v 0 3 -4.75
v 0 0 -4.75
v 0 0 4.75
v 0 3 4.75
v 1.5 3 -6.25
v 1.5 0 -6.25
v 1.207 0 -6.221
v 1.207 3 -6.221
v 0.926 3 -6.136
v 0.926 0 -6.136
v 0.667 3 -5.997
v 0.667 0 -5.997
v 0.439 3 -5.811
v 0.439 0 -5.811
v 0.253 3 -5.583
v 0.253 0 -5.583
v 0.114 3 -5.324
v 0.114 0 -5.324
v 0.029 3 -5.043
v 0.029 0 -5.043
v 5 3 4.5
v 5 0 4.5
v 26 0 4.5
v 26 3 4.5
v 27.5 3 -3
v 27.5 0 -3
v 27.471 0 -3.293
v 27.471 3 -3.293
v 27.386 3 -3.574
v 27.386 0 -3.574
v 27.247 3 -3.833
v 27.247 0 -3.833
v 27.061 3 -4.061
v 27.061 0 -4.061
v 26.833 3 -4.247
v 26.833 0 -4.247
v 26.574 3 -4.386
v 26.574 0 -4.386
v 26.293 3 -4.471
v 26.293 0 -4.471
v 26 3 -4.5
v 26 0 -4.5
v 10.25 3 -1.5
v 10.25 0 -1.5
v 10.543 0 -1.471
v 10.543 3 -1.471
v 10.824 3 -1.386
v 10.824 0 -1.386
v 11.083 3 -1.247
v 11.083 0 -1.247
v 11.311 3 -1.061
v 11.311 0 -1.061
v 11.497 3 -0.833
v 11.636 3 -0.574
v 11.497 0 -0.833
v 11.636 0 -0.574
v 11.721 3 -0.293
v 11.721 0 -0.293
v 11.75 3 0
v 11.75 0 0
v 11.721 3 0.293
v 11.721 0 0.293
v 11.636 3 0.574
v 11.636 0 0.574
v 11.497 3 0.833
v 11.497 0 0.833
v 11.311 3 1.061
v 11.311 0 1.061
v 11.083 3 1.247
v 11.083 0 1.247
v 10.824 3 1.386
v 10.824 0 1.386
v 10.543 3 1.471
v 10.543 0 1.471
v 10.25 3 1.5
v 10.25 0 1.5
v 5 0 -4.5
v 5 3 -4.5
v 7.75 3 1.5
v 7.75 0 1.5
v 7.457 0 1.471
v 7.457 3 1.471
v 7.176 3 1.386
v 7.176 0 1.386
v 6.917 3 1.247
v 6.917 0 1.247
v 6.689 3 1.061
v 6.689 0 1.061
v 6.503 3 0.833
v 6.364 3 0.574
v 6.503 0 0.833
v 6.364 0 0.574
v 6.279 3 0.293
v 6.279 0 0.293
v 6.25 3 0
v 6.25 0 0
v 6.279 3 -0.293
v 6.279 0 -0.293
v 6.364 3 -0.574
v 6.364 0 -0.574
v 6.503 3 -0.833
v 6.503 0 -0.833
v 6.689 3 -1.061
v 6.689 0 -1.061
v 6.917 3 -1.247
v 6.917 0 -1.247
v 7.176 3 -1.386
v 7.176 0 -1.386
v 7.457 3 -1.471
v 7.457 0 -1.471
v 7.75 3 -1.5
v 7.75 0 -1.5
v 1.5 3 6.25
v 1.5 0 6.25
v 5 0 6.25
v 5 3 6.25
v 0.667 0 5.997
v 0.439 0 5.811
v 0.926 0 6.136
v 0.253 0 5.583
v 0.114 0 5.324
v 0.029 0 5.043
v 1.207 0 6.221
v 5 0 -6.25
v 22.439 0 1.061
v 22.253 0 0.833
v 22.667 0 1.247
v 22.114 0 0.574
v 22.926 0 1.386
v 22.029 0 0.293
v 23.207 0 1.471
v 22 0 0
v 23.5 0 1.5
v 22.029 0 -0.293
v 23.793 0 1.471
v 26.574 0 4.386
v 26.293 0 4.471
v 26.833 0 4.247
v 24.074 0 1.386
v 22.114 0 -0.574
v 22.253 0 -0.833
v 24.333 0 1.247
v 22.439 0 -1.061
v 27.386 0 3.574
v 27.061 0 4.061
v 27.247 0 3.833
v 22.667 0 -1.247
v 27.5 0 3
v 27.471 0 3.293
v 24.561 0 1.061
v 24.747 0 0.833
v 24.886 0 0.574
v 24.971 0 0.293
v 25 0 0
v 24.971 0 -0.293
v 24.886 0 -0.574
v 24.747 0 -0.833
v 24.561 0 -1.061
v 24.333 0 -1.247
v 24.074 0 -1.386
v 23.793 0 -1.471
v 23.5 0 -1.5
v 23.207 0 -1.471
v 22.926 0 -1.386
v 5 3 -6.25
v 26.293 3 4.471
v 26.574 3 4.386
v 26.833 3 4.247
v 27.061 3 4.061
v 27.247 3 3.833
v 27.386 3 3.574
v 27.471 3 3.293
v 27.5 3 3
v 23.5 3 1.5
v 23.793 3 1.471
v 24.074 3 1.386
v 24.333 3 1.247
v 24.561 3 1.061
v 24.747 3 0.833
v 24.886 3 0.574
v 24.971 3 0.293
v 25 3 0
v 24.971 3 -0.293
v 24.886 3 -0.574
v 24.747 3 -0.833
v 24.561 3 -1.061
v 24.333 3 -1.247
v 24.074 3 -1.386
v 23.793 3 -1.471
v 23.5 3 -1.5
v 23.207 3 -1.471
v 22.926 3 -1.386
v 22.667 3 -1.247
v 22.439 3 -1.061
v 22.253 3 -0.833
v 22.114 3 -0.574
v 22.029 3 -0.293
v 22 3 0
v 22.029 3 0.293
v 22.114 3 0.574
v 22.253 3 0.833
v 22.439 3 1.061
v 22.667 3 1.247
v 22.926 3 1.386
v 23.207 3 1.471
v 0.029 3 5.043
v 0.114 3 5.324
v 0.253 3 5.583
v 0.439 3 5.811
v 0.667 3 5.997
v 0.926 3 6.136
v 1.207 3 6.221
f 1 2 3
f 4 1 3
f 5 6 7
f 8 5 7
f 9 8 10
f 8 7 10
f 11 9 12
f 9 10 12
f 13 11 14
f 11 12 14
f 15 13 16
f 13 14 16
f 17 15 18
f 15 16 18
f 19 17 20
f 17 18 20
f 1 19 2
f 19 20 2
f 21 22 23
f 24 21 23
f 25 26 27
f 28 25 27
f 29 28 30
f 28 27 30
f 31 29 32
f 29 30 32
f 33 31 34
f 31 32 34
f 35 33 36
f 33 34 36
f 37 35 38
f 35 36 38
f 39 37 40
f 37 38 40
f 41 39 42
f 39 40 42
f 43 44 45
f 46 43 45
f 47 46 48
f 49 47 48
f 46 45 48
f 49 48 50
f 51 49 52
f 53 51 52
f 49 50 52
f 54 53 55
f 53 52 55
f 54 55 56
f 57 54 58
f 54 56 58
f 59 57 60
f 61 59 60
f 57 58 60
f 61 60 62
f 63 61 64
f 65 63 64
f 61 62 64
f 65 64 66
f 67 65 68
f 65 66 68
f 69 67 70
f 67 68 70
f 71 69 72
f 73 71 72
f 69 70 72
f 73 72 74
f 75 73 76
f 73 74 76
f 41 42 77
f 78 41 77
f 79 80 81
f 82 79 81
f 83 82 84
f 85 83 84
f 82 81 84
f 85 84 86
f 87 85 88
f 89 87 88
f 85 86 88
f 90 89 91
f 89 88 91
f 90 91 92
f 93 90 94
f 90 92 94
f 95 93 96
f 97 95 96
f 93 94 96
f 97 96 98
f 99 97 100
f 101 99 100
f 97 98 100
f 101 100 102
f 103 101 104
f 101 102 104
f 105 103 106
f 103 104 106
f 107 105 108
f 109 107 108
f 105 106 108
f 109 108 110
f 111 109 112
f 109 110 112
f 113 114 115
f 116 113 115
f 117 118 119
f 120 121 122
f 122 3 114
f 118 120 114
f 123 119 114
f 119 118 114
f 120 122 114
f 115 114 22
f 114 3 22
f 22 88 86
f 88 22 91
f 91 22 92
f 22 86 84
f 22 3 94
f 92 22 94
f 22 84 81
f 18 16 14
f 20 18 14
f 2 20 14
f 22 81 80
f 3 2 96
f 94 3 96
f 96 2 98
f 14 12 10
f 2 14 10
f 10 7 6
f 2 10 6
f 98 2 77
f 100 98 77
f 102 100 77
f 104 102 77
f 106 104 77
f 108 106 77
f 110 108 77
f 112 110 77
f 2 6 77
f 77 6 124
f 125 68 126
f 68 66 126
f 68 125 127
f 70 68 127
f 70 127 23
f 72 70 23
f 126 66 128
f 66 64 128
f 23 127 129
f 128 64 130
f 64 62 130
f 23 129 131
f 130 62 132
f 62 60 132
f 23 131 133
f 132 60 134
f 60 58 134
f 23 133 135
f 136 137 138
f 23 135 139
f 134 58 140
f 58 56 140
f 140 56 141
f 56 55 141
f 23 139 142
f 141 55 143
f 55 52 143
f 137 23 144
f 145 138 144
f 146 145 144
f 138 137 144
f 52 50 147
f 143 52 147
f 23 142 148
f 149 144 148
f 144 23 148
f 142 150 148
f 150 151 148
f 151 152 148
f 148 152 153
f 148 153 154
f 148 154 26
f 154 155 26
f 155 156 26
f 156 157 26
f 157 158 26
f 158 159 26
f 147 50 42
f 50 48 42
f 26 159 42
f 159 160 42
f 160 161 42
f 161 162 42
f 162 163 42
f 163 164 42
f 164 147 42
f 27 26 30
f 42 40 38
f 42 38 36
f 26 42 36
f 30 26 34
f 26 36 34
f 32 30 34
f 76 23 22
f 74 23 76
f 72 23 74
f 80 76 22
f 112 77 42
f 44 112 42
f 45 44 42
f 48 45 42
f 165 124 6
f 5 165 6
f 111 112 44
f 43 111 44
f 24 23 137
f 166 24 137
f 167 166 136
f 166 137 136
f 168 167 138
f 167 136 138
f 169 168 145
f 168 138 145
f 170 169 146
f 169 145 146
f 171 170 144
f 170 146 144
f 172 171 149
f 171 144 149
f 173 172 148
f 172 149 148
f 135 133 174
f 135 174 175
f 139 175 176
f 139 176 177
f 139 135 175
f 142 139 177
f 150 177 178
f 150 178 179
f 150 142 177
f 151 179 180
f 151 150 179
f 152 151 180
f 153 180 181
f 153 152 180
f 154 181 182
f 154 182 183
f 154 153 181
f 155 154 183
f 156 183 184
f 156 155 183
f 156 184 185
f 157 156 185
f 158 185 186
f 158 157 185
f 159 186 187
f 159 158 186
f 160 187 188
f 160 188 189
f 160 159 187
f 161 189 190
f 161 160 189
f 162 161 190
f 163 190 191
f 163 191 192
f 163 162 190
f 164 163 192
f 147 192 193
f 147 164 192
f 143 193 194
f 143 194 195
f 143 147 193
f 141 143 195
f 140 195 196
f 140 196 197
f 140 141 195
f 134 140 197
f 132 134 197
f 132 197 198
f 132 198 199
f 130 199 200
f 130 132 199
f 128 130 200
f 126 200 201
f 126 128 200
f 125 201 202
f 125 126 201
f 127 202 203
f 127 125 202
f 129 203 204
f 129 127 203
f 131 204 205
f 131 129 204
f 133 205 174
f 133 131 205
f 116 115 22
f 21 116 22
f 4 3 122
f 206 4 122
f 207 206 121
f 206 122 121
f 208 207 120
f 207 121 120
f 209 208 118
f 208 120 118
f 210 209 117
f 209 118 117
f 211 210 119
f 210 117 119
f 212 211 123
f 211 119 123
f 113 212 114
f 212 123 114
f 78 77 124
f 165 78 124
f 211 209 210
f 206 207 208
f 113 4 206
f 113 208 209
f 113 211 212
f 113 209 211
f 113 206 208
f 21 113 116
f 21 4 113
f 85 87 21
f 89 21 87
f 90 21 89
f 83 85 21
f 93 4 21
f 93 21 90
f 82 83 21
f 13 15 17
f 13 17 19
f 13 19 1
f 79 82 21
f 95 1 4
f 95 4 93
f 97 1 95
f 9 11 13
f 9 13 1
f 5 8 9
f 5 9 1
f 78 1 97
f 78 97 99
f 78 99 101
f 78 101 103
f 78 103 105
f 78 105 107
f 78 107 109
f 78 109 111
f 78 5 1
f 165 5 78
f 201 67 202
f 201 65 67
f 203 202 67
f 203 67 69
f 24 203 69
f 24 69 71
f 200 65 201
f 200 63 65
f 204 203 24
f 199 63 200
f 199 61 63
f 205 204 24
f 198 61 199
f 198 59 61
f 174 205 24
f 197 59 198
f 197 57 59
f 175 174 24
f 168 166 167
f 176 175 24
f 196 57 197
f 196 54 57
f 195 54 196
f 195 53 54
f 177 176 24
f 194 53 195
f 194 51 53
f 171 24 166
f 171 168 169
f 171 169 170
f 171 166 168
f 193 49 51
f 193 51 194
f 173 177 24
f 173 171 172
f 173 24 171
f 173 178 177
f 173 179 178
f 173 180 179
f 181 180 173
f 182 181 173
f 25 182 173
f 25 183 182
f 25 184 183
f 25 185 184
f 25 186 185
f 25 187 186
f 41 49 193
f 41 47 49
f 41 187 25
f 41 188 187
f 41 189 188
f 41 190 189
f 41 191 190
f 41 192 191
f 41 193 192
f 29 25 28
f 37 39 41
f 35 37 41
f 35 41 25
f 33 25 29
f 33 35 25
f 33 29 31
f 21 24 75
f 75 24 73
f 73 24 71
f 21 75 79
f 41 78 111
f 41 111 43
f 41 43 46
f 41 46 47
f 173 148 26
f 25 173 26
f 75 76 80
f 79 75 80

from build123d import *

# Parameters (mm, degrees)
SKETCH_1_R      = 1.5
EXTRUDE_1_DEPTH = 3


with BuildPart() as part:
    # 草图1 → 凸台-拉伸1 (new body)
    with BuildSketch(Plane(origin=(0, 0, 0), x_dir=(1, 0, 0), z_dir=(0, 1, 0))):
        with BuildLine():
            Line((0, 4.75), (0, -4.75))
            ThreePointArc((0, -4.75), (0.439339828, -5.810660172), (1.5, -6.25))
            Line((1.5, -6.25), (5, -6.25))
            Line((5, -6.25), (5, -4.5))
            Line((5, -4.5), (26, -4.5))
            ThreePointArc((26, -4.5), (27.060660172, -4.060660172), (27.5, -3))
            Line((27.5, -3), (27.5, 3))
            ThreePointArc((27.5, 3), (27.060660172, 4.060660172), (26, 4.5))
            Line((26, 4.5), (5, 4.5))
            Line((5, 4.5), (5, 6.25))
            Line((5, 6.25), (1.5, 6.25))
            ThreePointArc((1.5, 6.25), (0.439339828, 5.810660172), (0, 4.75))
        make_face()
        with Locations(Location((23.5, 0, 0), (0, 0, 270))):
            Circle(SKETCH_1_R, mode=Mode.SUBTRACT)
        with BuildLine():
            Line((7.75, 1.5), (10.25, 1.5))
            ThreePointArc((10.25, 1.5), (11.75, 0), (10.25, -1.5))
            Line((10.25, -1.5), (7.75, -1.5))
            ThreePointArc((7.75, -1.5), (6.25, 0), (7.75, 1.5))
        make_face(mode=Mode.SUBTRACT)
    extrude(amount=EXTRUDE_1_DEPTH)


solid = part.part
